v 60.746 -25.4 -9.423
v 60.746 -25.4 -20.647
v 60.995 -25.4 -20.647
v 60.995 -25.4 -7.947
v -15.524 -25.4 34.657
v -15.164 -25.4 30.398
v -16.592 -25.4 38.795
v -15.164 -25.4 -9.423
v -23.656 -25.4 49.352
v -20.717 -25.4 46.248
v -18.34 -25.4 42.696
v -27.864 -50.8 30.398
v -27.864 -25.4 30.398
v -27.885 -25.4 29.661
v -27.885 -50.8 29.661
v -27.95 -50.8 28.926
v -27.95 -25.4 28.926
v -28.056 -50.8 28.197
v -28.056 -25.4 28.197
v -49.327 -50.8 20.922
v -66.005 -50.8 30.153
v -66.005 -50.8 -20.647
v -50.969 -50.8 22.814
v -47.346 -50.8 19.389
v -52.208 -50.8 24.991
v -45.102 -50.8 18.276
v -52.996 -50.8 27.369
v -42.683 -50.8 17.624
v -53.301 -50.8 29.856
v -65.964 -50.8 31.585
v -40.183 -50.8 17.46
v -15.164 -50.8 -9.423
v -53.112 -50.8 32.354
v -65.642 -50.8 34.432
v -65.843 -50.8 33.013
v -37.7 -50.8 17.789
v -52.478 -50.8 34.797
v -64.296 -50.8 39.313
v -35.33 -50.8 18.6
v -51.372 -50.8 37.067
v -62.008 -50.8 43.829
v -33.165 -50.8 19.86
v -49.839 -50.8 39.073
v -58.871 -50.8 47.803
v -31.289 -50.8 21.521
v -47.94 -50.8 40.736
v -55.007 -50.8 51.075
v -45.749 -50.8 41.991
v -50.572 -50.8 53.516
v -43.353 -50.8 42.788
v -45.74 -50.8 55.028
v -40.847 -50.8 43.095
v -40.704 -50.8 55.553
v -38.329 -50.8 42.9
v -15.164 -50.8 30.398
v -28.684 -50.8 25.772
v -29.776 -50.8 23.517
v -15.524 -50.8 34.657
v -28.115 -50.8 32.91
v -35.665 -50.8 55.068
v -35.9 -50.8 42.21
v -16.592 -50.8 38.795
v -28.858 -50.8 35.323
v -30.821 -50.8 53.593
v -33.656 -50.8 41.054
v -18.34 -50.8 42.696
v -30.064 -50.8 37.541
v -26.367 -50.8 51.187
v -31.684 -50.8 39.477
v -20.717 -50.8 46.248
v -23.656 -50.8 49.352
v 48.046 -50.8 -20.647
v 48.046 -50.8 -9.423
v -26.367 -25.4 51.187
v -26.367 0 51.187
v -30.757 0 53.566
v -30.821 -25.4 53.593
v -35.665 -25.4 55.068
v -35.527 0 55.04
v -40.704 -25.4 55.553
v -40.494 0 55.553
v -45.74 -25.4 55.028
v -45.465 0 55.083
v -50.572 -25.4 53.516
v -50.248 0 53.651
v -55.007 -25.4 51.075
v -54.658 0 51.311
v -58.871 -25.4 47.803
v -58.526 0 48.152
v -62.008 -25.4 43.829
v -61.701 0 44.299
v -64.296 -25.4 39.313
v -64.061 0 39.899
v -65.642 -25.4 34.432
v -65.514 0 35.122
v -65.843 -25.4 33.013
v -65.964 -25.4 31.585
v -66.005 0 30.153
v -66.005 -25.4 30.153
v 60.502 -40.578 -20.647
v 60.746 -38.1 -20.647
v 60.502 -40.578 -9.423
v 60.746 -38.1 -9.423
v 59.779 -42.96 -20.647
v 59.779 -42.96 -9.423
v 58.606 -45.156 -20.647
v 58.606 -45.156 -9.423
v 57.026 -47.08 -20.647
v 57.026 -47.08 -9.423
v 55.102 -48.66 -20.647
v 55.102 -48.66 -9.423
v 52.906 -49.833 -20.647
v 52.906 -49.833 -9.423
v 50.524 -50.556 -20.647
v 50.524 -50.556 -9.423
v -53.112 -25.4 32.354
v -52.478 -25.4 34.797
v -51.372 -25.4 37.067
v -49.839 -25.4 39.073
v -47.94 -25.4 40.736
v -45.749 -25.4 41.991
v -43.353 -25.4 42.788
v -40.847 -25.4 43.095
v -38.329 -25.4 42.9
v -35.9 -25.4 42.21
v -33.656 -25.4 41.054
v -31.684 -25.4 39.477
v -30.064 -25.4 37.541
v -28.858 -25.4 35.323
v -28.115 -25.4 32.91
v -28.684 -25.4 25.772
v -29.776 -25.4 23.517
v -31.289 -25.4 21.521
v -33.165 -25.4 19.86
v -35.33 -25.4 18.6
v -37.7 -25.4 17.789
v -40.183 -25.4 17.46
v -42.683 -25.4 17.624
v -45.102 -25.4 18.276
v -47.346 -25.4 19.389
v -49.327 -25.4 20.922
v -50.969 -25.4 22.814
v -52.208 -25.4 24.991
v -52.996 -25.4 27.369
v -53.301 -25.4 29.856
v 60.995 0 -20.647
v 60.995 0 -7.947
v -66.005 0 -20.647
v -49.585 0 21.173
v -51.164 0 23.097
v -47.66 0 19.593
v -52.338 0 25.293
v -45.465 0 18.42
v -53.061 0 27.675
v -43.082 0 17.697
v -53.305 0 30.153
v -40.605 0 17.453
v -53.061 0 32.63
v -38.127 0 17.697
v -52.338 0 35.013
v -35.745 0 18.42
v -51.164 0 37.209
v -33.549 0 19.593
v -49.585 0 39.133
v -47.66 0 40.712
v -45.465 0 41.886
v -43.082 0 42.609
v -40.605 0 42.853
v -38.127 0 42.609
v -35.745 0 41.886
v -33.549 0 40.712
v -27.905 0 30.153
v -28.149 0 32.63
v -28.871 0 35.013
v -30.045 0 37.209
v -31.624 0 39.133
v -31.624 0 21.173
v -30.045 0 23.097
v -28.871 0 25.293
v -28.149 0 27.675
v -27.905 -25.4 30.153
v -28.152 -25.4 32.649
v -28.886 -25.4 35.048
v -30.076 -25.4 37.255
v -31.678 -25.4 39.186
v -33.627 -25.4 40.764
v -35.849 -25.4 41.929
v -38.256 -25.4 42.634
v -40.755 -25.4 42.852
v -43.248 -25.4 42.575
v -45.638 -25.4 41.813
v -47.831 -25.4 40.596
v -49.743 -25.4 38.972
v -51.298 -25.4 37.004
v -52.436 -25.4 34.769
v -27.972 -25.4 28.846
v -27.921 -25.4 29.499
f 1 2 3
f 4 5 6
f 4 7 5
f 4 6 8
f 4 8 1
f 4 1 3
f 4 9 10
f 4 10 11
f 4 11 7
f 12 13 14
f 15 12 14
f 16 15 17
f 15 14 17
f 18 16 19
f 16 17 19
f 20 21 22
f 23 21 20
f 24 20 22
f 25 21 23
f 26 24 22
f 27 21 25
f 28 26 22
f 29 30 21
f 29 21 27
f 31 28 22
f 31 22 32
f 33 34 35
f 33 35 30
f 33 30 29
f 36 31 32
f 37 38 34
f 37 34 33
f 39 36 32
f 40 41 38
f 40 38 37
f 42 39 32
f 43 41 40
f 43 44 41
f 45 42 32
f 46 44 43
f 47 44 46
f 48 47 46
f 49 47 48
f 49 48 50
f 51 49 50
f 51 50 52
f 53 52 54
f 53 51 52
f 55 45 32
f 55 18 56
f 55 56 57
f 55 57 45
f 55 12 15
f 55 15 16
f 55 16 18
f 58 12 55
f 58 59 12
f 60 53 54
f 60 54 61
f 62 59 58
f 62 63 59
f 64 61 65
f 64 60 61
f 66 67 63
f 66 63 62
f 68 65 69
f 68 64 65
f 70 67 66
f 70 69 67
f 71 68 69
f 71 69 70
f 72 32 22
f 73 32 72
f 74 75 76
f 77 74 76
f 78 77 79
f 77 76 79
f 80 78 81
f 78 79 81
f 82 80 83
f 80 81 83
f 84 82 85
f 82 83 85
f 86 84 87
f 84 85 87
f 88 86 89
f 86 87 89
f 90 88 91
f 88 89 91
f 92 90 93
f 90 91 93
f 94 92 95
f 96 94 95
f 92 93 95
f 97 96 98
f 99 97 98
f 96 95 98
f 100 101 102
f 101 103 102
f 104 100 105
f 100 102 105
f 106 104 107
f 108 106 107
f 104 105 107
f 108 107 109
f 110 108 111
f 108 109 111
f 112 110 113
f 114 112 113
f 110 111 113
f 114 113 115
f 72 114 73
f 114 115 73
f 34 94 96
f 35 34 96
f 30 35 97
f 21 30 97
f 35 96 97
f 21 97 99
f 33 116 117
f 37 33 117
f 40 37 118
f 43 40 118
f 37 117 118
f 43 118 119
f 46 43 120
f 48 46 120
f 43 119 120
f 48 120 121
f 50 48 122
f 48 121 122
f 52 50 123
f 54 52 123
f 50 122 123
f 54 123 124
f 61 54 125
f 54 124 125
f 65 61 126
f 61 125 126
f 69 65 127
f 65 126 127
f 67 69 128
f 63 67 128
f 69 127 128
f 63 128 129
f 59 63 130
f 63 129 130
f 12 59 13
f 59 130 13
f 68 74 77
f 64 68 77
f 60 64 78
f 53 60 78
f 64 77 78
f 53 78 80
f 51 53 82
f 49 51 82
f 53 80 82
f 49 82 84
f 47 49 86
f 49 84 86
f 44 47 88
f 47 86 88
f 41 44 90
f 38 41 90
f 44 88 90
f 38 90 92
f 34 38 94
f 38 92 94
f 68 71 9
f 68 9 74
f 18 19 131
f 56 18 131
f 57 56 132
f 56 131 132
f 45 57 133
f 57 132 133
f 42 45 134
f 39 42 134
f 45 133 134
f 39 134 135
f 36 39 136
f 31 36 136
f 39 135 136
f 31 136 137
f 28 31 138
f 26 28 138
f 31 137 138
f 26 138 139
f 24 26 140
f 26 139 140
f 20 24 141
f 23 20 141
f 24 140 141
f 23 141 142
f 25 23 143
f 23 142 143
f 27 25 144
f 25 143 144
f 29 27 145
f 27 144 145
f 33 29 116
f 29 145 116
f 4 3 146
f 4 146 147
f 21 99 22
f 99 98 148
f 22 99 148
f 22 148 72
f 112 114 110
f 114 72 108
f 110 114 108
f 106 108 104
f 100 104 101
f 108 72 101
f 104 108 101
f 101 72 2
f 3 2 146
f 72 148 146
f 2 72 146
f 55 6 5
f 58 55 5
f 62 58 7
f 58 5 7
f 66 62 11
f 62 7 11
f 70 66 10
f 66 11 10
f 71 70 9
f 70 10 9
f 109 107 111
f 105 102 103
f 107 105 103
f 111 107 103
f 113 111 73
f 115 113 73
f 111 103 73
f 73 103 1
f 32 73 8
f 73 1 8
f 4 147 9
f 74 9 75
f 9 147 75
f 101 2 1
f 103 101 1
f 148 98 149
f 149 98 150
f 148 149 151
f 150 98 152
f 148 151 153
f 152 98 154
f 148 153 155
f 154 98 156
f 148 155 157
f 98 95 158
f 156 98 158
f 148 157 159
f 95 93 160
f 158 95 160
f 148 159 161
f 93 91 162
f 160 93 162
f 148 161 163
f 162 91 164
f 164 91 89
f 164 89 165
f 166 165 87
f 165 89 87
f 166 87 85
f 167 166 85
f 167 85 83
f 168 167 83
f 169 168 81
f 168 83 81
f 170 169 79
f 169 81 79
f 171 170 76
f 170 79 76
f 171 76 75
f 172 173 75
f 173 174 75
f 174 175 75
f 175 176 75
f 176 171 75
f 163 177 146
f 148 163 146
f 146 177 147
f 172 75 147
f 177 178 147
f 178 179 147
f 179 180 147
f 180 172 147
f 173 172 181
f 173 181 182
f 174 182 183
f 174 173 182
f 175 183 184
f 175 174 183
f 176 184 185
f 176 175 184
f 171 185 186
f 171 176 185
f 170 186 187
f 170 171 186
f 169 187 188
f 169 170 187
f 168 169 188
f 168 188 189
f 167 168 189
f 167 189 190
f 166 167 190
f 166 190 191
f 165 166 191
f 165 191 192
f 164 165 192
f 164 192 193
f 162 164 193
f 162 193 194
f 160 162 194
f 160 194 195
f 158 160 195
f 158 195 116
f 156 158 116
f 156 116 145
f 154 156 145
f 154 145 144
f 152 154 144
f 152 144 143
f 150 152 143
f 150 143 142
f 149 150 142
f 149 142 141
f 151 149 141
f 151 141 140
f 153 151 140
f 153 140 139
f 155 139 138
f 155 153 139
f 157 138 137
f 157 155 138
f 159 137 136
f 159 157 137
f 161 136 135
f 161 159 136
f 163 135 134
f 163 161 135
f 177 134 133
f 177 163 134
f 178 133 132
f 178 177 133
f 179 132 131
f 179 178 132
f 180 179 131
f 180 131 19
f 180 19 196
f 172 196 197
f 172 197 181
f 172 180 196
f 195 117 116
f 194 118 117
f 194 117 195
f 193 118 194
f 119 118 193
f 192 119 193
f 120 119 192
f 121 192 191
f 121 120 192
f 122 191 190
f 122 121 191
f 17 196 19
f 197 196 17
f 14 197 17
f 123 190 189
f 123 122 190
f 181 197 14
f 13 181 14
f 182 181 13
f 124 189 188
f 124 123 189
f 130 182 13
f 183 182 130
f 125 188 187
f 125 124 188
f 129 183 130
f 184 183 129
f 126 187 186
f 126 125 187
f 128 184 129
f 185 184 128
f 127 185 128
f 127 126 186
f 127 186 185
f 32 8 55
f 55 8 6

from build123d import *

# Parameters (mm, degrees)
F0_R     = 12.7
F1_DEPTH = 25.4
F3_DEPTH = 25.4
F4_R     = 12.7


with BuildPart() as f1:
    # F0 (on Front) → F1 (new body)
    with BuildSketch(Plane.XZ):
        with BuildLine():
            Line((60.995375, -7.947213), (-26.366752, 51.187115))
            ThreePointArc((-26.366752, 51.187115), (-52.510884, 52.589386), (-66.004625, 30.152787))
            Line((-66.004625, 30.152787), (-66.004625, -20.647213))
            Line((-66.004625, -20.647213), (60.995375, -20.647213))
            Line((60.995375, -20.647213), (60.995375, -7.947213))
        make_face()
        with Locations((-40.604625, 30.152787)):
            Circle(F0_R, mode=Mode.SUBTRACT)
    extrude(amount=F1_DEPTH)

    # F2 (on face) → F3 (join)
    with BuildSketch(Plane.XZ.offset(25.4)):
        with BuildLine():
            Line((60.746003, -20.647213), (60.746003, -9.422782))
            Line((60.746003, -9.422782), (-15.164001, -9.422782))
            Line((-15.164001, -9.422782), (-15.164001, 30.397678))
            ThreePointArc((-15.164001, 30.397678), (-17.383882, 40.782384), (-23.655506, 49.351907))
            Line((-23.655506, 49.351907), (-26.366752, 51.187115))
            ThreePointArc((-26.366752, 51.187115), (-50.57153, 53.515595), (-65.641578, 34.431919))
            ThreePointArc((-65.641578, 34.431919), (-65.9137, 32.300039), (-66.004625, 30.152787))
            Line((-66.004625, 30.152787), (-66.004625, -20.647213))
            Line((-66.004625, -20.647213), (-65.891497, -20.647213))
            Line((-65.891497, -20.647213), (60.746003, -20.647213))
        make_face()
        with BuildLine():
            ThreePointArc((-53.112497, 32.353501), (-39.583159, 43.059745), (-27.864001, 30.397678))
            ThreePointArc((-27.864001, 30.397678), (-27.912124, 29.293135), (-28.056129, 28.196964))
            ThreePointArc((-28.056129, 28.196964), (-42.682993, 17.624005), (-53.112497, 32.353501))
        make_face(mode=Mode.SUBTRACT)
    extrude(amount=F3_DEPTH)

    # F4
    f4_edges = [f1.edges().sort_by_distance(p)[0] for p in [
        (60.746003, -50.8, -15.034997),
    ]]
    fillet(f4_edges, radius=F4_R)


solid = f1.part
